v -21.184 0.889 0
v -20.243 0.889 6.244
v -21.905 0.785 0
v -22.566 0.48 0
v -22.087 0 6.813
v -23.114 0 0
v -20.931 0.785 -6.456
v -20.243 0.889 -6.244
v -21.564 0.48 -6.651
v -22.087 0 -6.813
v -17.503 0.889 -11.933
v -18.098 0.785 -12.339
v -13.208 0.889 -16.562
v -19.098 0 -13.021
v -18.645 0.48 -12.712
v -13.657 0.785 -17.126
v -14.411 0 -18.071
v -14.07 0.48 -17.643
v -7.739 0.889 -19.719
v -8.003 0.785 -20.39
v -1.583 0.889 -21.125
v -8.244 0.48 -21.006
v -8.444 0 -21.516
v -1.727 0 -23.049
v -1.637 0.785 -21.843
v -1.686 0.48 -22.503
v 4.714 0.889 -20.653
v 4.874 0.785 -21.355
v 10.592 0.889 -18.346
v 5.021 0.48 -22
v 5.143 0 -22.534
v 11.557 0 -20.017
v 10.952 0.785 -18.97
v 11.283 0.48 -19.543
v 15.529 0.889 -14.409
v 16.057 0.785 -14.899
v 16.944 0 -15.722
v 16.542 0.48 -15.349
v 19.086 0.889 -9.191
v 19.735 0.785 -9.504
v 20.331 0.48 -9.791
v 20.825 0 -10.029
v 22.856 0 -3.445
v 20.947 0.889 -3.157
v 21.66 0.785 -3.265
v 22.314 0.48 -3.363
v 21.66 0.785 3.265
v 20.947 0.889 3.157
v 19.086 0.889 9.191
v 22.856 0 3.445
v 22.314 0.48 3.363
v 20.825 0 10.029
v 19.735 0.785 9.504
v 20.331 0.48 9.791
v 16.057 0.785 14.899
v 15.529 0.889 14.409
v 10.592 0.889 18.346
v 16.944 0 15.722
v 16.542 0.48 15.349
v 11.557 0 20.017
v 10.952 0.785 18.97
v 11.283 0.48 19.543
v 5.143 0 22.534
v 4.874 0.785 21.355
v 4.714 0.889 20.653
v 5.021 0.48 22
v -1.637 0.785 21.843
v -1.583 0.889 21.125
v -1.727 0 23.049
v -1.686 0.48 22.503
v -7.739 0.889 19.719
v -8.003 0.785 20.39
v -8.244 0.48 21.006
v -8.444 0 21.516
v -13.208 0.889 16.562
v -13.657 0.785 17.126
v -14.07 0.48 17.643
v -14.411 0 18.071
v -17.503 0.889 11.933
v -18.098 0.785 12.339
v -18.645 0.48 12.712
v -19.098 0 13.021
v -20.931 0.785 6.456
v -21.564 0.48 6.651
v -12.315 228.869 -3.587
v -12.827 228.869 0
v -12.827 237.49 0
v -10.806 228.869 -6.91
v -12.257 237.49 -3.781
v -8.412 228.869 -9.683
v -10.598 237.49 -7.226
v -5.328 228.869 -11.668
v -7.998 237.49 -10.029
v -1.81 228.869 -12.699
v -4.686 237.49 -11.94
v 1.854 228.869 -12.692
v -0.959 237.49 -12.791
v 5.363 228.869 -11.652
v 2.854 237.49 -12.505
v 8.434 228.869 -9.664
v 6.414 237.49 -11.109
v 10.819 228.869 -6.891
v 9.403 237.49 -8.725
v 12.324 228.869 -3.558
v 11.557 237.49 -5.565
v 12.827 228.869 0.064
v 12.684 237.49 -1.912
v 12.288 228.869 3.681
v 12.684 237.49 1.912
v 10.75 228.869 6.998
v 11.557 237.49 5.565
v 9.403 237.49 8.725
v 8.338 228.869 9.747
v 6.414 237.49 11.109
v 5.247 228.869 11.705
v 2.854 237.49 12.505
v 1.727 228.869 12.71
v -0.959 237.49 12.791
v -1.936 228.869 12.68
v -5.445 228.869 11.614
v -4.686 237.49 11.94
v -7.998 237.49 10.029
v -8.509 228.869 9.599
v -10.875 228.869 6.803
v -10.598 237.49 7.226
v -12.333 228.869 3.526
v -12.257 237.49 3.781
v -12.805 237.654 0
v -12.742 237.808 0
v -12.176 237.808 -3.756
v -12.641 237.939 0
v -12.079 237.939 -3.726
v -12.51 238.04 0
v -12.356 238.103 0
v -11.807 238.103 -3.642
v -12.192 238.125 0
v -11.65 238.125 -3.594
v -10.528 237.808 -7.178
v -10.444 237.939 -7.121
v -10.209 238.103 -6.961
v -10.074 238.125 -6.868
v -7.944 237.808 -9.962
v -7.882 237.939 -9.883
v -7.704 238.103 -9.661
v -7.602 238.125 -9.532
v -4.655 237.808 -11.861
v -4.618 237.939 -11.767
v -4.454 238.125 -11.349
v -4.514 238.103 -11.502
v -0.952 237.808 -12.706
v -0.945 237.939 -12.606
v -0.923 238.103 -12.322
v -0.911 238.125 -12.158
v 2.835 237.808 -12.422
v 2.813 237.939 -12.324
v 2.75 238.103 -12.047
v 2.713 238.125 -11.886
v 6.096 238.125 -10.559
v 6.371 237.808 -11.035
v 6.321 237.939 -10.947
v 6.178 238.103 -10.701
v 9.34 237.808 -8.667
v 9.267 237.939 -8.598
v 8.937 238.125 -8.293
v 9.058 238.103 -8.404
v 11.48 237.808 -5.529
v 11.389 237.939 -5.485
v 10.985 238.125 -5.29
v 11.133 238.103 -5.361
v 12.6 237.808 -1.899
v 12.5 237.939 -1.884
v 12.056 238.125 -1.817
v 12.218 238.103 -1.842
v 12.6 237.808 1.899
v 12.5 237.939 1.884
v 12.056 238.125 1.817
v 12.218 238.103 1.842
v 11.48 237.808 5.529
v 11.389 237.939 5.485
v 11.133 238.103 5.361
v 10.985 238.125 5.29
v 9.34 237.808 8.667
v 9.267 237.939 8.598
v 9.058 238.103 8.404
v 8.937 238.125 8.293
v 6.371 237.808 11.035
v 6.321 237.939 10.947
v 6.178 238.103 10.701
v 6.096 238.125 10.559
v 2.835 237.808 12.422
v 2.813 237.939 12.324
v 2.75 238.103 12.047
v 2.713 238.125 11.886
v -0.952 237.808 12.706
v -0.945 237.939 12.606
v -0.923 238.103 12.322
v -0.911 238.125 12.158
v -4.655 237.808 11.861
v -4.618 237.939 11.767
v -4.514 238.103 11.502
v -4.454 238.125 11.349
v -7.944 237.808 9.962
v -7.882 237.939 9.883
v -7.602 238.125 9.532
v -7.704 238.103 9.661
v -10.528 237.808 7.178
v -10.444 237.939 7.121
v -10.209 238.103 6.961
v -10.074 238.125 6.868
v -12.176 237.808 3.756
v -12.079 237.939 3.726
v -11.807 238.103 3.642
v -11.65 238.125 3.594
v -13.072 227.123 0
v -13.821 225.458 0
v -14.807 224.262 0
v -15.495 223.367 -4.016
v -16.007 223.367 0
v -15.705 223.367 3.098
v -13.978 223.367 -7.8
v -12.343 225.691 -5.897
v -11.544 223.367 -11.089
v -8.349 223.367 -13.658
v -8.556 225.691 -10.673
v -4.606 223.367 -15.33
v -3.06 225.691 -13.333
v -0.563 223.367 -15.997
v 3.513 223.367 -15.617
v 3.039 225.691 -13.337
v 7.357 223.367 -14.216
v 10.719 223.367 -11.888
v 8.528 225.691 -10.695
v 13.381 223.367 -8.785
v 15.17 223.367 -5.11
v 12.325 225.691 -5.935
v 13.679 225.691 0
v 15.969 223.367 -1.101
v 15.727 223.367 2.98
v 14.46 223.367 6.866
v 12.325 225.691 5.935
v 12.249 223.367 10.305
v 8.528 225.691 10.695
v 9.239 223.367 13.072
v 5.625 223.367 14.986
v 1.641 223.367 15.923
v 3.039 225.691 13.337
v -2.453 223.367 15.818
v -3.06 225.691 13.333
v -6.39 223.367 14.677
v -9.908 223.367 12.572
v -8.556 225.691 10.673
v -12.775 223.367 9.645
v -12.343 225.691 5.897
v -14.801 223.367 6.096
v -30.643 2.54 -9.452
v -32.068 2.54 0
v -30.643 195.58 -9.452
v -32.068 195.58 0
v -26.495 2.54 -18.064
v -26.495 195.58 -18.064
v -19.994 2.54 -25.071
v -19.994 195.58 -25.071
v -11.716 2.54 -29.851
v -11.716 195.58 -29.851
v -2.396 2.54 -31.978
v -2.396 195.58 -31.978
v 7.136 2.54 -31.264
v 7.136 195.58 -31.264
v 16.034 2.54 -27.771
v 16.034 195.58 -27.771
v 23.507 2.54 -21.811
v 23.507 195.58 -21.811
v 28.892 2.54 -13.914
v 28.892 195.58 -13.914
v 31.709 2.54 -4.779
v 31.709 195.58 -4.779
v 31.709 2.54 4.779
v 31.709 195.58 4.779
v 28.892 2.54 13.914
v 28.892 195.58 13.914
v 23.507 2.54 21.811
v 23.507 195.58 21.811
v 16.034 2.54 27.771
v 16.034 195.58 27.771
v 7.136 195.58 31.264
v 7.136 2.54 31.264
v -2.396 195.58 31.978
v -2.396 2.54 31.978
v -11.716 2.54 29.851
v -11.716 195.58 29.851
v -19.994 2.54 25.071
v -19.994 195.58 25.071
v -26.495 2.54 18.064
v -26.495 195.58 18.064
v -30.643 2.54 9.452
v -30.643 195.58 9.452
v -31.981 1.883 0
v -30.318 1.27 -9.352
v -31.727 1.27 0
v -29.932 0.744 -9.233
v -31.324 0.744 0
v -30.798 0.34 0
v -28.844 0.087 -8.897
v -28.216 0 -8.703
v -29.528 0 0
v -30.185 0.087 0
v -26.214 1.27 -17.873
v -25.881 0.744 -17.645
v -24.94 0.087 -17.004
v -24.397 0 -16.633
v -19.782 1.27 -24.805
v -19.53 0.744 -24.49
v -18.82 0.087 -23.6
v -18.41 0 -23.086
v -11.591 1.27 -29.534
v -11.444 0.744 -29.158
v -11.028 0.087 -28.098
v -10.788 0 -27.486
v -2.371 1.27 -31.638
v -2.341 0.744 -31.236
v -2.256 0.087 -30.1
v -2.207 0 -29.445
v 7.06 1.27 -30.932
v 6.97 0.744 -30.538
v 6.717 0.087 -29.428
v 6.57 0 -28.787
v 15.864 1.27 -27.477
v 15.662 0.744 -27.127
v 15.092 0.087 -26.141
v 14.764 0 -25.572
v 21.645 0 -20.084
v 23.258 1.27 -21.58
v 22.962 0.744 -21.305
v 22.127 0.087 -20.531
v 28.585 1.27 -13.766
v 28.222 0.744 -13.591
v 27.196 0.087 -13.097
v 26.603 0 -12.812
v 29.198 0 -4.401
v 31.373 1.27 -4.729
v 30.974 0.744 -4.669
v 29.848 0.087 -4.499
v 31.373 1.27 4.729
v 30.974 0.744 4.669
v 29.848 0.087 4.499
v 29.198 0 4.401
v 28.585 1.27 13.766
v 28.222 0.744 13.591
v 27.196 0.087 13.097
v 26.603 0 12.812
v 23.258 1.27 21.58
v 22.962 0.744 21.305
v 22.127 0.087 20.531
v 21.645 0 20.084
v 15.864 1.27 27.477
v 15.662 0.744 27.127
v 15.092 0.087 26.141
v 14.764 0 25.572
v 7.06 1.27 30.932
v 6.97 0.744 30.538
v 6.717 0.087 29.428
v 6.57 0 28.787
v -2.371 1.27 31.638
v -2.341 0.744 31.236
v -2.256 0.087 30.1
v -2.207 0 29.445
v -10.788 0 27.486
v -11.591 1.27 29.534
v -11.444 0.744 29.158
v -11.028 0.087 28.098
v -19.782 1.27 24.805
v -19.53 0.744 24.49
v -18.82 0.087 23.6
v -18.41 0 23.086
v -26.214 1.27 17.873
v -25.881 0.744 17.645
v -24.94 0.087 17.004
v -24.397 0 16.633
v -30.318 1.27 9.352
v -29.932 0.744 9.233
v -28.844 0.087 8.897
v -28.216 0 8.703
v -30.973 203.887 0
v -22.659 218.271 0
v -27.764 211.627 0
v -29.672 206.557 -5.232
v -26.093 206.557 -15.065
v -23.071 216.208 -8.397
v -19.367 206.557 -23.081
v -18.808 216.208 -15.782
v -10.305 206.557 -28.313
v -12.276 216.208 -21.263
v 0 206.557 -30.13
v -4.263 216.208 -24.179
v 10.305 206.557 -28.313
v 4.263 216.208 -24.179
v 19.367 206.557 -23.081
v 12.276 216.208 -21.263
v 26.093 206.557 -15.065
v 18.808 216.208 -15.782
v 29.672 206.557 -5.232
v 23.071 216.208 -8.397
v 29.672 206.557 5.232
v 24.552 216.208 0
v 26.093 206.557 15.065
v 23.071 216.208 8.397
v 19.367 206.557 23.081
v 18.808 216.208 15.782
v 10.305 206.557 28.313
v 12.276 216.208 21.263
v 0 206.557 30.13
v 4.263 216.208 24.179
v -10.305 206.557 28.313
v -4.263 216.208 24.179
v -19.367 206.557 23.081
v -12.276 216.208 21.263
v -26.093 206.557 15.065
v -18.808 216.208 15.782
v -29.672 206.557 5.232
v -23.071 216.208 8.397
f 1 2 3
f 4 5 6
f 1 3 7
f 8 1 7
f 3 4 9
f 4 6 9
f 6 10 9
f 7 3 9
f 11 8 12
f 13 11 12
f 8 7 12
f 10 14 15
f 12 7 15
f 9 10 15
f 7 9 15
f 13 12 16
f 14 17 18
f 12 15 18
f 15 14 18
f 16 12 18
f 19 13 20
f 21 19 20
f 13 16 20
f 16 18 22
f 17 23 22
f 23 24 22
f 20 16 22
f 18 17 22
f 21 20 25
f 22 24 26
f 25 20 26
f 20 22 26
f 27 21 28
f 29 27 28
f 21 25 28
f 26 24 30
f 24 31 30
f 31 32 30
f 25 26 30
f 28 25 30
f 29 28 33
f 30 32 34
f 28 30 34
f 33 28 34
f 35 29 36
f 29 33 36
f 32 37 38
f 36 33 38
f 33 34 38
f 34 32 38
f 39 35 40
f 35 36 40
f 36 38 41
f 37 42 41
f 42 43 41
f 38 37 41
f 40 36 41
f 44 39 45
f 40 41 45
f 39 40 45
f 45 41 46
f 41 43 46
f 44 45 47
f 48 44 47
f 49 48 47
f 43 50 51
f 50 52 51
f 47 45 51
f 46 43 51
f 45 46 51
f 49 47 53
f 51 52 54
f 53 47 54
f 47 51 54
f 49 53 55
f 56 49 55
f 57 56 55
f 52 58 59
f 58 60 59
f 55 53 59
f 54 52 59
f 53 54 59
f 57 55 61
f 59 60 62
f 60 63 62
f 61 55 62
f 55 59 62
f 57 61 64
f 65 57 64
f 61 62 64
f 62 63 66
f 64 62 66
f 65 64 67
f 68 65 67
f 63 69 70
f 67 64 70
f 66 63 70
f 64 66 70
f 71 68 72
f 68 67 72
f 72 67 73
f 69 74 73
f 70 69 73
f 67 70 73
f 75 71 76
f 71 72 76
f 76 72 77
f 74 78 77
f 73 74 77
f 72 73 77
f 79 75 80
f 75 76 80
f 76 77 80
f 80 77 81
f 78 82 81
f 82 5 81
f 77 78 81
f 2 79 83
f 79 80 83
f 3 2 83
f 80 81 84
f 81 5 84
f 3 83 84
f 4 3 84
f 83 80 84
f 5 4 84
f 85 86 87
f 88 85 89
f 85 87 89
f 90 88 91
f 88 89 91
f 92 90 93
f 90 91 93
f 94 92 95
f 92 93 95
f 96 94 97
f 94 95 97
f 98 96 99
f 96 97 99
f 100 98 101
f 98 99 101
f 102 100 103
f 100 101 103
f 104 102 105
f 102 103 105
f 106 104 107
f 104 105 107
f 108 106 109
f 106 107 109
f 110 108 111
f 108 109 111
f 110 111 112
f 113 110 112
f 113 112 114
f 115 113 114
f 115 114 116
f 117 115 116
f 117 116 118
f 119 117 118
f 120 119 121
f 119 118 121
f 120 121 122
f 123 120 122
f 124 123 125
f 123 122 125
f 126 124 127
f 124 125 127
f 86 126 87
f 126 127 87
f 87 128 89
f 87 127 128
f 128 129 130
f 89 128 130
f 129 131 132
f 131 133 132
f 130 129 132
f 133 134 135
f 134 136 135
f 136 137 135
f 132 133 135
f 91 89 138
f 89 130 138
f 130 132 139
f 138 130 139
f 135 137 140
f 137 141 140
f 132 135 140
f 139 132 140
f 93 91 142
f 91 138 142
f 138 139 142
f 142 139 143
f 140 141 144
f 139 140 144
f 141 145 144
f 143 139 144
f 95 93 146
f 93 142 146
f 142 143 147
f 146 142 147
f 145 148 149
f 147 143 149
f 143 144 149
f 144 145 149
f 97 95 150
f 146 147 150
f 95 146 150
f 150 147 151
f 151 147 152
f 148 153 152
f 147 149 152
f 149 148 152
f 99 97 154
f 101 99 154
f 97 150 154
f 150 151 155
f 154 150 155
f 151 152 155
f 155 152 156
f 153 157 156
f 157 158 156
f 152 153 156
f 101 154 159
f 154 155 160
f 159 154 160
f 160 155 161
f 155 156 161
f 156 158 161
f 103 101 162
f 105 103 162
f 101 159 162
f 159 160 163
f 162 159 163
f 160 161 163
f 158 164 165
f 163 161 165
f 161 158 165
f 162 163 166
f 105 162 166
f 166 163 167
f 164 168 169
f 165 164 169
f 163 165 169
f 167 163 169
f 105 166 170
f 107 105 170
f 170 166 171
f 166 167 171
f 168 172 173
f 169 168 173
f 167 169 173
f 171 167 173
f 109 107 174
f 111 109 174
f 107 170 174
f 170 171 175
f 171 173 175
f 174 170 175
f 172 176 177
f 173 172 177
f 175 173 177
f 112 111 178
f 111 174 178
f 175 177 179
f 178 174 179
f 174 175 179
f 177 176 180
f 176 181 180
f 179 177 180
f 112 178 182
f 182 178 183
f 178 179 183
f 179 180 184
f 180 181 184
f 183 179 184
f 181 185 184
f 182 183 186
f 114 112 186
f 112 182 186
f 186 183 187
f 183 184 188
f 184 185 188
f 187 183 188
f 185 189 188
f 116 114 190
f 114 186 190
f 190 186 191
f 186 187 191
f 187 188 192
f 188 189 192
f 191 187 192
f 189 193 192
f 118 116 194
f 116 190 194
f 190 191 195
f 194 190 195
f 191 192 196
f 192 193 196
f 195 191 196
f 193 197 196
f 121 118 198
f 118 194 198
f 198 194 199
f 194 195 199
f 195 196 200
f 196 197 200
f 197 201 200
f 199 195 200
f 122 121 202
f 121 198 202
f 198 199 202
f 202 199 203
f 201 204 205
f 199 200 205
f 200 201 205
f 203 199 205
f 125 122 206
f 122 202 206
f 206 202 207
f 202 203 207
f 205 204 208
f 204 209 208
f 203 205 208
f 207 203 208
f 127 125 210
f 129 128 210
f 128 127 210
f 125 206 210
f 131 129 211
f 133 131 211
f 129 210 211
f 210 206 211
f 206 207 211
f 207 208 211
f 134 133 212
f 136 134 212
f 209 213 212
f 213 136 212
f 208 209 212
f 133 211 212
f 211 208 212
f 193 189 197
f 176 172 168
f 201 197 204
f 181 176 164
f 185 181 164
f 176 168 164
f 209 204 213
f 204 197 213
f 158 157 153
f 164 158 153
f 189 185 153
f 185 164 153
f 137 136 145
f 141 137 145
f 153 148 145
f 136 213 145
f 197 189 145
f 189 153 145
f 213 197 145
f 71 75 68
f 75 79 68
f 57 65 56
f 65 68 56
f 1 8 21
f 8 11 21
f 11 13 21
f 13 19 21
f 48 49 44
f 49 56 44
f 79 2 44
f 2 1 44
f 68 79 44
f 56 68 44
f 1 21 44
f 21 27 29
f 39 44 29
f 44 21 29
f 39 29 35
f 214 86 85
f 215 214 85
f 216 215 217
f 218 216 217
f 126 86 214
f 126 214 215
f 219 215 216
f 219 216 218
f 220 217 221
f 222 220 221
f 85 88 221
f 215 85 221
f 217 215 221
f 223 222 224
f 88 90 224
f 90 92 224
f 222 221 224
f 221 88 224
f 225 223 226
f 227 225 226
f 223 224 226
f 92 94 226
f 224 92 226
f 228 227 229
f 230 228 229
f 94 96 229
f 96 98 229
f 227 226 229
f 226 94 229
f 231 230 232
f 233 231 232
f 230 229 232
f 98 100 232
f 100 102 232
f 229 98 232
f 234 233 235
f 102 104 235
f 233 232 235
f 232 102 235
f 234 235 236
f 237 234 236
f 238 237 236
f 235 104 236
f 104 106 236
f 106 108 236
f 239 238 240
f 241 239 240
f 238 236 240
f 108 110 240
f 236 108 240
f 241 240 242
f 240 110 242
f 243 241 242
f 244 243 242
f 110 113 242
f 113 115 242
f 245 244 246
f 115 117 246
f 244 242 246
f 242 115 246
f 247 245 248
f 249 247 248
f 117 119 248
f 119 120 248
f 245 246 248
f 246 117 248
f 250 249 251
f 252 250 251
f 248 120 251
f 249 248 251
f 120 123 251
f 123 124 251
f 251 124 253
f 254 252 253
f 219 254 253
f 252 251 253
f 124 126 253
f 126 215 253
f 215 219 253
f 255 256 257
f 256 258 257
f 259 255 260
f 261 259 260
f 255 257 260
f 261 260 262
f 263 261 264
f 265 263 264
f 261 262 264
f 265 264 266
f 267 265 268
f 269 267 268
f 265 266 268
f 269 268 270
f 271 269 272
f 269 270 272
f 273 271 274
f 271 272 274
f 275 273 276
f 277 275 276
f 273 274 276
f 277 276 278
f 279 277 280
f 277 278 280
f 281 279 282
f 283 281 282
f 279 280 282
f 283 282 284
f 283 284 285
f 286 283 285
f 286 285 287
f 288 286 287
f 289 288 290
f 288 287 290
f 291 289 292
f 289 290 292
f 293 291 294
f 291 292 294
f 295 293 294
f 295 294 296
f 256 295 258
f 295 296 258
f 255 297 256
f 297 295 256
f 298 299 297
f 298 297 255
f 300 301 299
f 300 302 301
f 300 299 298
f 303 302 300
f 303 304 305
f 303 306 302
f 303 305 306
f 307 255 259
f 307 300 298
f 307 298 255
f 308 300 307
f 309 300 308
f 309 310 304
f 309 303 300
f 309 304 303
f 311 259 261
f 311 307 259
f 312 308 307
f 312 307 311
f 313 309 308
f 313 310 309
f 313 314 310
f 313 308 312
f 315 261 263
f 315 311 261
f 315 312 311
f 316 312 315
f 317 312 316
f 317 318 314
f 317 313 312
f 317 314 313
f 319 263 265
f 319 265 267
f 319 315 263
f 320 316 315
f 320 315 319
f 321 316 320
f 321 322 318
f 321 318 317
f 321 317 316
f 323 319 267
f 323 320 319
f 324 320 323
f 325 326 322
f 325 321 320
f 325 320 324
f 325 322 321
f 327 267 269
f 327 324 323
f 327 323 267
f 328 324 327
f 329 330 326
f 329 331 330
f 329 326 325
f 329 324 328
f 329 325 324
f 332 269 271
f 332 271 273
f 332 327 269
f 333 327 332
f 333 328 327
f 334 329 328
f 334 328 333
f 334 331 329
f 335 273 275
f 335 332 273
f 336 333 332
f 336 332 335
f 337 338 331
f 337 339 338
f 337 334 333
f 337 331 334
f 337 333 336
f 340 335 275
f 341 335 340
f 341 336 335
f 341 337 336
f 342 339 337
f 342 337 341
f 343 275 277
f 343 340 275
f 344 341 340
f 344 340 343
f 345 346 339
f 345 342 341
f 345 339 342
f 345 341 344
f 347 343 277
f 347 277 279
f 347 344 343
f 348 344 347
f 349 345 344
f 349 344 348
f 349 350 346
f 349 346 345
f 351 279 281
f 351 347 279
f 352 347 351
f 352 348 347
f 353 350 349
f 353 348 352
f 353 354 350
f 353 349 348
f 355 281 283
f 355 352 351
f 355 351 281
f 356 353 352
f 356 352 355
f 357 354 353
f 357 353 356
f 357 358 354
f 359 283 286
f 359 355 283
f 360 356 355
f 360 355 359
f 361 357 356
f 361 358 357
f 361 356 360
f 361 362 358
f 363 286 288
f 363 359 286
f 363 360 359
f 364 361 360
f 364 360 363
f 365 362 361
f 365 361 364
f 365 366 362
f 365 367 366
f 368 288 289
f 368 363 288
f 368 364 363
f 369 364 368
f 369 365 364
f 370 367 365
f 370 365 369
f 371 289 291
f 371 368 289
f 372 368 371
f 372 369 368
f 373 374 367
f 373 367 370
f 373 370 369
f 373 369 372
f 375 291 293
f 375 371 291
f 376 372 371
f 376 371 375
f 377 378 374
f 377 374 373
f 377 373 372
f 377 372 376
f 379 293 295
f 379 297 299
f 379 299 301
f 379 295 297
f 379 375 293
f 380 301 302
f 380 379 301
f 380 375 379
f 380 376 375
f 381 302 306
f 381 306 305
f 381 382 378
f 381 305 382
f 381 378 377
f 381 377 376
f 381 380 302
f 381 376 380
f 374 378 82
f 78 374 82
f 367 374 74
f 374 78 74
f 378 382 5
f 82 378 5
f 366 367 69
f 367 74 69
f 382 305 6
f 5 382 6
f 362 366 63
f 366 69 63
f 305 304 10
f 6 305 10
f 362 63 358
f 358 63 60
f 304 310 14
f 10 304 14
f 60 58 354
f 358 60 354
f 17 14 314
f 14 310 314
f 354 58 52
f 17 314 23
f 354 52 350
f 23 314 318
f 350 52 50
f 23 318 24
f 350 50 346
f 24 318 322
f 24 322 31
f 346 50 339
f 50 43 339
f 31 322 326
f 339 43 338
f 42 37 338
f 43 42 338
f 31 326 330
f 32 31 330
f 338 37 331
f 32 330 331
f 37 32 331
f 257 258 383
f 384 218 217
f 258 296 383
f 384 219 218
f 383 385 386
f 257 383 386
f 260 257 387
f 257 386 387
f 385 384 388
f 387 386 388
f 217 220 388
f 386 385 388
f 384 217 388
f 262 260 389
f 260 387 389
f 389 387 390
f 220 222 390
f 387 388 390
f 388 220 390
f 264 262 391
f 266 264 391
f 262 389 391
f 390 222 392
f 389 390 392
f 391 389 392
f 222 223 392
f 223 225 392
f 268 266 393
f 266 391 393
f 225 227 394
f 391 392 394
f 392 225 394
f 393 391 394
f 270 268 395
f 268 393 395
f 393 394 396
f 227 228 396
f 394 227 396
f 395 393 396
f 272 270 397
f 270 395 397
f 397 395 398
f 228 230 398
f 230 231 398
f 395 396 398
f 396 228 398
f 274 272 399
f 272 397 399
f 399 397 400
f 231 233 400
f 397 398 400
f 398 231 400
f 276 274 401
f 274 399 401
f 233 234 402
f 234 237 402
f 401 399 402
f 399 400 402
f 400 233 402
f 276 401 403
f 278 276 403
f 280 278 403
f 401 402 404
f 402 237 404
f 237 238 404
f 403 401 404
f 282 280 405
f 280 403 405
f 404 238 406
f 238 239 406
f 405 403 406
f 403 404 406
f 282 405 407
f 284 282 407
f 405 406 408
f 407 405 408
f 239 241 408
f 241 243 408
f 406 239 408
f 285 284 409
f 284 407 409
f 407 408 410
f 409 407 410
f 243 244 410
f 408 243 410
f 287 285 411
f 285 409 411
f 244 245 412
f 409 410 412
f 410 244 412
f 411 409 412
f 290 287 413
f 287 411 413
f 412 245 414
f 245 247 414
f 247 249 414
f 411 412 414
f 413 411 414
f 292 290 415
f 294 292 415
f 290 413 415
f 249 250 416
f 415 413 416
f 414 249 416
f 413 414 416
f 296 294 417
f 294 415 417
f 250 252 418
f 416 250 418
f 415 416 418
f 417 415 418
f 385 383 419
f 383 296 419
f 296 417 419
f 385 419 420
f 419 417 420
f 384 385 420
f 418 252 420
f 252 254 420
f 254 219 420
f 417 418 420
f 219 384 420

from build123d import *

# Parameters (mm, degrees)
FILLET1_R = 2.54
FILLET2_R = 0.635
FILLET3_R = 6.35


with BuildPart() as part:
    # Sketch2 → Revolve1 (revolve)
    with BuildSketch(Plane.XY, mode=Mode.PRIVATE) as revolve1_sk:
        with BuildLine():
            Line((32.0675, 0), (32.0675, 195.58))
            ThreePointArc((32.0675, 195.58), (26.829595401, 213.144093113), (12.827, 224.97034922))
            Line((12.827, 224.97034922), (12.827, 238.125))
            Line((12.827, 238.125), (0, 238.125))
            Line((0, 238.125), (0, 0.889))
            Line((0, 0.889), (23.114, 0.889))
            Line((23.114, 0.889), (23.114, 0))
            Line((23.114, 0), (32.0675, 0))
        make_face()
    revolve(revolve1_sk.sketch.rotate(Axis((0, 238.125, 0), (0, -1, 0)), 180), axis=Axis((0, 238.125, 0), (0, -1, 0)))

    # Fillet1
    # the kernel refuses this fillet: 2.54 mm, written as the material it adds along each edge
    with BuildSketch(Plane(origin=(0, 0.889, 0), x_dir=(-1, 0, 0), z_dir=(0, 0, 1))) as fillet1_piece_1:
        with BuildLine():
            CenterArc((21.183767112, 2.54), FILLET1_R, 270, 49.458398126)
            Line((23.114, 0.889), (23.114, 0))
            Line((23.114, 0), (21.183767112, 0))
        make_face()
    revolve(axis=Axis((0, 0.889, 0), (0, -1, 0)))
    # the kernel refuses this fillet: 2.54 mm, written as the material it takes off along each edge
    with BuildSketch(Plane(origin=(0, 0, 0), x_dir=(-1, 0, 0), z_dir=(0, 0, 1))) as fillet1_2_piece_1:
        with BuildLine():
            CenterArc((32.0675 - FILLET1_R, -FILLET1_R), FILLET1_R, 0, 90)
            Line((32.0675 - FILLET1_R, 0), (32.0675, 0))
            Line((32.0675, 0), (32.0675, -FILLET1_R))
        make_face()
    revolve(axis=Axis((0, 0, 0), (0, -1, 0)), mode=Mode.SUBTRACT)

    # Fillet2
    fillet2_edges = [part.edges().sort_by_distance(p)[0] for p in [
        (12.827, 238.125, 0),
    ]]
    fillet(fillet2_edges, radius=FILLET2_R)

    # Fillet3
    fillet3_edges = [part.edges().sort_by_distance(p)[0] for p in [
        (12.827, 224.97034922, 0),
    ]]
    fillet(fillet3_edges, radius=FILLET3_R)


solid = part.part
